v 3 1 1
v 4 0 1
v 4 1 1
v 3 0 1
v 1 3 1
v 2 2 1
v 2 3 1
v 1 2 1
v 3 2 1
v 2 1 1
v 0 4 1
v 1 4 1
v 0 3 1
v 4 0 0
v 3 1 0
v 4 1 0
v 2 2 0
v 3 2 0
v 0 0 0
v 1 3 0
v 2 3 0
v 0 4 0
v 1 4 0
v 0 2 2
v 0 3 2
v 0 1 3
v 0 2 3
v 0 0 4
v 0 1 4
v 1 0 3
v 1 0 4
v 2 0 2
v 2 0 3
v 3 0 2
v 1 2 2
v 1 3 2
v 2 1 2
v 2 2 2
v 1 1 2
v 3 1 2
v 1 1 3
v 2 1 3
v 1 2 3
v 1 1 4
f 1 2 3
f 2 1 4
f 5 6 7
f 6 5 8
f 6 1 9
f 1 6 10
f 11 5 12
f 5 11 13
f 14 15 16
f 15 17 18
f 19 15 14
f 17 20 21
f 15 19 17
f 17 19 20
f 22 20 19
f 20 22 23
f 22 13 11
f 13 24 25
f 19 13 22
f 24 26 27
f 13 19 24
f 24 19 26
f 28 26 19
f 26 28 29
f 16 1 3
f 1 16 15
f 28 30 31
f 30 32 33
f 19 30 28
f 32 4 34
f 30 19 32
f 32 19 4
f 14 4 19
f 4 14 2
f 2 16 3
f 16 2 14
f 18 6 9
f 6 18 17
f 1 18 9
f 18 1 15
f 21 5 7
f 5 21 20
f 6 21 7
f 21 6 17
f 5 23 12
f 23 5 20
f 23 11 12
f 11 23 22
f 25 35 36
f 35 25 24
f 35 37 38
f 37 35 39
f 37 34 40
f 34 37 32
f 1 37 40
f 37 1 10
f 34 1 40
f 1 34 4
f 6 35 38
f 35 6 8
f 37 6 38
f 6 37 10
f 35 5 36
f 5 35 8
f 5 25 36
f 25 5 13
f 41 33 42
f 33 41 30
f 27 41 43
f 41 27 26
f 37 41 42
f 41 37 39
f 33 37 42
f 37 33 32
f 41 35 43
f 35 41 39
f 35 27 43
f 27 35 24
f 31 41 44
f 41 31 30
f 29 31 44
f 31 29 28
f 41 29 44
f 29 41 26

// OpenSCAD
module pattern(n){
    for(z_pos = [0:1:n]){
        for(y_pos = [0:1:n-z_pos]){
            for(x_pos = [0:1:n-y_pos-z_pos]){
                translate([x_pos,y_pos,z_pos])cube(1);
            }
        }
    }
}

pattern(3);
